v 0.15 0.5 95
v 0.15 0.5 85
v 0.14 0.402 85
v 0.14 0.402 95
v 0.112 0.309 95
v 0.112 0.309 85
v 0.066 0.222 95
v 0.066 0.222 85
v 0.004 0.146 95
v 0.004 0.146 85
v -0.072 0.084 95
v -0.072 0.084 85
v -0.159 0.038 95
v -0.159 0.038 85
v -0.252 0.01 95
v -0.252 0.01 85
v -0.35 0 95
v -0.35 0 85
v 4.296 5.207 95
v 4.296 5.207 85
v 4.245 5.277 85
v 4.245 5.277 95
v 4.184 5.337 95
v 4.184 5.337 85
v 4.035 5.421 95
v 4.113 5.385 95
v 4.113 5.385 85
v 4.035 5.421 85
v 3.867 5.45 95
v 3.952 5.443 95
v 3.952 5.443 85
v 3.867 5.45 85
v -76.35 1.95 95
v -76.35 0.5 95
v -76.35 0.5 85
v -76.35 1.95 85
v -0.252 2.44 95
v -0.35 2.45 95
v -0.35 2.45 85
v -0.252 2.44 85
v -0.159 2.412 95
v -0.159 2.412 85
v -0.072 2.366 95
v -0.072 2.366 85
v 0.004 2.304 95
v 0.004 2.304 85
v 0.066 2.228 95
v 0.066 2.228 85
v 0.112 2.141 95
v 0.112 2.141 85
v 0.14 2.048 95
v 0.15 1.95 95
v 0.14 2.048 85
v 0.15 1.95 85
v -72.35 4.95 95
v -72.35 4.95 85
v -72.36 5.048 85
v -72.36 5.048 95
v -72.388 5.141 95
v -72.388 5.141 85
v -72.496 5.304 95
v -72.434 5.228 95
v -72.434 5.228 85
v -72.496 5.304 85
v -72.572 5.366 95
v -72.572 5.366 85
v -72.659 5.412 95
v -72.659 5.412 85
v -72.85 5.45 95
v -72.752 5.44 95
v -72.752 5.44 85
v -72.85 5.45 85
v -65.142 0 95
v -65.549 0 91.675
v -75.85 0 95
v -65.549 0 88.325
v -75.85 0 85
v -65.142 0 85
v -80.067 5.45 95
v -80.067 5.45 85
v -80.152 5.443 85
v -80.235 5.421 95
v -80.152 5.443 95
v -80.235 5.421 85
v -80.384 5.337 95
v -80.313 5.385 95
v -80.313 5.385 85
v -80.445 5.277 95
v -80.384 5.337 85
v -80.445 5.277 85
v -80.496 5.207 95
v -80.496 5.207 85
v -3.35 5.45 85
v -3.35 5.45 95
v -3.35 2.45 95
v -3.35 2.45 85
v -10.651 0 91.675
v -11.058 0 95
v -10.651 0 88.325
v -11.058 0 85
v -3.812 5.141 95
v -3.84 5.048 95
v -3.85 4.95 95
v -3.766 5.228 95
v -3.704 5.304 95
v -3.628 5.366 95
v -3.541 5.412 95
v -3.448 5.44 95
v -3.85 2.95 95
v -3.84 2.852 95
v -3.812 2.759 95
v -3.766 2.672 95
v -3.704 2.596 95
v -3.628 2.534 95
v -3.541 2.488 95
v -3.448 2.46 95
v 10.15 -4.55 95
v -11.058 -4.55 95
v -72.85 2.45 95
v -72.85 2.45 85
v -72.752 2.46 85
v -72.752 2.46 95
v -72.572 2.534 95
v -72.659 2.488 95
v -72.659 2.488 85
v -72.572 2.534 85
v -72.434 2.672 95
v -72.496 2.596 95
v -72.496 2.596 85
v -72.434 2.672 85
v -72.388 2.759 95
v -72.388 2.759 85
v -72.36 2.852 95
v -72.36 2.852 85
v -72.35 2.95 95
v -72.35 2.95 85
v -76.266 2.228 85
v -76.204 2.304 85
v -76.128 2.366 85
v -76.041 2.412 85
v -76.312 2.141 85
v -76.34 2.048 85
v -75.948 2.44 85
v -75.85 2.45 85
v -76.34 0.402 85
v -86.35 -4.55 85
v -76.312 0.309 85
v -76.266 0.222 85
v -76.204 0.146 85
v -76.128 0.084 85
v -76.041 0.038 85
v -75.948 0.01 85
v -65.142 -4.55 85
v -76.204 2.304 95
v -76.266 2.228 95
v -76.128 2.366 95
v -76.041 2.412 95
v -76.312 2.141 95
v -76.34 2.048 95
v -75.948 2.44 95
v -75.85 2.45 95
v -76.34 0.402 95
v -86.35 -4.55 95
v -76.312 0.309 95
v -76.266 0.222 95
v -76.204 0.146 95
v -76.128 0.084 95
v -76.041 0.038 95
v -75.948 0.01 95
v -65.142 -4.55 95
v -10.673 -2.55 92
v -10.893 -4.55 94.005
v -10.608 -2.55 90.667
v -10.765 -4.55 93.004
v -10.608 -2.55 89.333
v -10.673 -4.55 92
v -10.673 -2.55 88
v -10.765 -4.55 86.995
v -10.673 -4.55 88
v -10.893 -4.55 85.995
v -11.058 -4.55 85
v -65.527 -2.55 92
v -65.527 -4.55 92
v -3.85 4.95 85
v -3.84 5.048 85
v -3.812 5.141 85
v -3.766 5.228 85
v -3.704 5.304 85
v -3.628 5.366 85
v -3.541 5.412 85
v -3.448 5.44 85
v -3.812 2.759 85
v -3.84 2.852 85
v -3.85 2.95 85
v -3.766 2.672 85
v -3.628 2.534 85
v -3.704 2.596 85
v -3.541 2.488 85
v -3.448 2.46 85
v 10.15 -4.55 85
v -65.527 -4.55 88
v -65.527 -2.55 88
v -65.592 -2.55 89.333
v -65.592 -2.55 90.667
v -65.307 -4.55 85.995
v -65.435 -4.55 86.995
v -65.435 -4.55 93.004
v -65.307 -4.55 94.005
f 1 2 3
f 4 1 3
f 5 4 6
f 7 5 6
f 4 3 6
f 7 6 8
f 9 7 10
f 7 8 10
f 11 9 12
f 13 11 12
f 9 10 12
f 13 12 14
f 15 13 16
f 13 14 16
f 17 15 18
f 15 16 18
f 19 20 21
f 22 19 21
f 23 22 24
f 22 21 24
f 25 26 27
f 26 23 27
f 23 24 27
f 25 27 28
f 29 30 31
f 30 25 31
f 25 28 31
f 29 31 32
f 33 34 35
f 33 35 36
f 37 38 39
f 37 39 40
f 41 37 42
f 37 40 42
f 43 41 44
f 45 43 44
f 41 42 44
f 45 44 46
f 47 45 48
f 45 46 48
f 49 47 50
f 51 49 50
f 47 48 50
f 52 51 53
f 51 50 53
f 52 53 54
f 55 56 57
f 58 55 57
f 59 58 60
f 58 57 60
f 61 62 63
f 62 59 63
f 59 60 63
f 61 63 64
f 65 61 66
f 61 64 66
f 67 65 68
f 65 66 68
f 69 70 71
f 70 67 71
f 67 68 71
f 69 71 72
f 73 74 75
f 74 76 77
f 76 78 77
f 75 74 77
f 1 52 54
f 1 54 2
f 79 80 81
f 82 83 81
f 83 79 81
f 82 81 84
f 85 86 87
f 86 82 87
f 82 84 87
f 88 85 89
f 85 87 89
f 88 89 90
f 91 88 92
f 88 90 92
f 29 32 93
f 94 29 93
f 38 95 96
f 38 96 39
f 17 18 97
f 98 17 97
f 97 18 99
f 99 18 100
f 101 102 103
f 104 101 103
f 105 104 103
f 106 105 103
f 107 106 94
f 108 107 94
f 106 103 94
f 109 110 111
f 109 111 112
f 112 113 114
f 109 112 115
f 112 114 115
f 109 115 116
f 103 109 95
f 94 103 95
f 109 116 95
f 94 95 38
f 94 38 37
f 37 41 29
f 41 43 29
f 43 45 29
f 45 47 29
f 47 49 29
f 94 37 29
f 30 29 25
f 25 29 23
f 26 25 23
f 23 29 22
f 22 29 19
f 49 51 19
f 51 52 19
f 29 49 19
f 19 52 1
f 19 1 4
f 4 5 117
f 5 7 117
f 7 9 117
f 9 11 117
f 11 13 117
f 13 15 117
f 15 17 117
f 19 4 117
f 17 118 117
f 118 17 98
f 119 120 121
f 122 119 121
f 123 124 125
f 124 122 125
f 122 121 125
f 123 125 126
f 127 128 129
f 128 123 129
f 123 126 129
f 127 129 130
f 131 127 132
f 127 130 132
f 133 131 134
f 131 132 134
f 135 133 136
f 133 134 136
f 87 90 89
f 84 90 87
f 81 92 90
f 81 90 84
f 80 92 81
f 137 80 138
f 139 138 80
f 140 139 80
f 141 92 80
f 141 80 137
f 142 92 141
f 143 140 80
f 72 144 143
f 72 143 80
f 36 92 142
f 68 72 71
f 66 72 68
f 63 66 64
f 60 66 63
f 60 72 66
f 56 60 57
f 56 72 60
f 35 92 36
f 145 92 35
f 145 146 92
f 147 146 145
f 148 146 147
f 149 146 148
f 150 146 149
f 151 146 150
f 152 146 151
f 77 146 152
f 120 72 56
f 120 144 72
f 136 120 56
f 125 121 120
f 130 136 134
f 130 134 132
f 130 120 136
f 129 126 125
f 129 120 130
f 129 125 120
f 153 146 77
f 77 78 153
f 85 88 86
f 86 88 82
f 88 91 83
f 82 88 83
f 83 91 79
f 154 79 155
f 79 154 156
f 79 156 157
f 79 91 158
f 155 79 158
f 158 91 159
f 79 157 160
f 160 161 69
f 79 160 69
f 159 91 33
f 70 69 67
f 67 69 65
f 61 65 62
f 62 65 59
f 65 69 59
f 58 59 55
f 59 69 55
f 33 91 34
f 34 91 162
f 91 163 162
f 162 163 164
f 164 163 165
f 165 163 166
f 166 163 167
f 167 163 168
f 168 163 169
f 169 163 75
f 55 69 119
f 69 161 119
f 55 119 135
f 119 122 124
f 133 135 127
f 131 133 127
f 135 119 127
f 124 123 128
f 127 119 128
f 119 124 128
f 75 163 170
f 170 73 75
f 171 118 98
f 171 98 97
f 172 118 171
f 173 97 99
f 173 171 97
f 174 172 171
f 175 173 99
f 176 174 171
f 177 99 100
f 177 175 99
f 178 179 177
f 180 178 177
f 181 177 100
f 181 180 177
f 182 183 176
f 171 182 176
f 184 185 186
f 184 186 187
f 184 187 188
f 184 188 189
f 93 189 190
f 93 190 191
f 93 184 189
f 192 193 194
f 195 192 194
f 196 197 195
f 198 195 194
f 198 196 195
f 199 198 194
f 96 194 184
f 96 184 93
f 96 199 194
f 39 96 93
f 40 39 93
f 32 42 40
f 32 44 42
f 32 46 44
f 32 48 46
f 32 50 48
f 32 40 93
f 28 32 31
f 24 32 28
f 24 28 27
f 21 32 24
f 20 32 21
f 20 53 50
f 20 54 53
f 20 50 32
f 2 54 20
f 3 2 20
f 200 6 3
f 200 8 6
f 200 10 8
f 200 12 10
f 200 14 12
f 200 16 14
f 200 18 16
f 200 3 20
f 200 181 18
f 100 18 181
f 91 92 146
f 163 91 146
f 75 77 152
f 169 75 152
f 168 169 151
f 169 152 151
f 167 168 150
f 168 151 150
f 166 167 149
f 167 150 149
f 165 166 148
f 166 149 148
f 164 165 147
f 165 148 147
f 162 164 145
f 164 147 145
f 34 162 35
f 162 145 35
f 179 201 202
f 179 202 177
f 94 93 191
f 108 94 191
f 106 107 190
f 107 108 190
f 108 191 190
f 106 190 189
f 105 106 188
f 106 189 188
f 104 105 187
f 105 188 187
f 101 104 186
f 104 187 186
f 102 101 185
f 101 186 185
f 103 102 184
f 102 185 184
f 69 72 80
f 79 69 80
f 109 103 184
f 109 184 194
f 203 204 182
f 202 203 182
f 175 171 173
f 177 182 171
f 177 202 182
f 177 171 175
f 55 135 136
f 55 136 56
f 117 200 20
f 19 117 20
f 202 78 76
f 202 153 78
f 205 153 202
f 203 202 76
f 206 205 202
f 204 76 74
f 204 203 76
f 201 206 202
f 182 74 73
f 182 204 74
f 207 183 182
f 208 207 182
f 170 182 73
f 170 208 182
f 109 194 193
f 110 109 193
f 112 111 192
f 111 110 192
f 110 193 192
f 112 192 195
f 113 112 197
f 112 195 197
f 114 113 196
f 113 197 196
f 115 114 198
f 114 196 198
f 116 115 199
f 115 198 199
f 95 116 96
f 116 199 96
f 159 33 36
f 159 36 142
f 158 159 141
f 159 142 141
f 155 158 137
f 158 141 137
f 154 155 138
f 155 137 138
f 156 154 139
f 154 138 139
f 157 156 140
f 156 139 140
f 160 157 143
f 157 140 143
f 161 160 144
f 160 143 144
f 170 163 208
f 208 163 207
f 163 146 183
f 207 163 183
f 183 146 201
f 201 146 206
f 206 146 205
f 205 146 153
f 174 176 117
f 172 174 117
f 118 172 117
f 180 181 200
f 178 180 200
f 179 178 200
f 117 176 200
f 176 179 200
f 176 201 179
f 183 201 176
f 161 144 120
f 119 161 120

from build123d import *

# Parameters (mm, degrees)
BOSS_EXTRUDE1_DEPTH     = 180
SKETCH2_W               = 91.04
SKETCH2_H               = 5.45
CUT_EXTRUDE1_DEPTH      = 30
SKETCH3_W               = 91.04
SKETCH3_H               = 5.45
CUT_EXTRUDE2_DEPTH      = 30
FILLET1_R               = 1
FILLET2_R               = 1
FILLET3_R               = 1
CUT_EXTRUDE3_DEPTH      = 200.714859237
CUT_EXTRUDE3_DEPTH_BACK = 200.714859237
SKETCH4_R               = 4
SKETCH4_R_2             = 27.5
CUT_EXTRUDE4_DEPTH      = 200.890776426
CUT_EXTRUDE4_DEPTH_BACK = 200.890776426
SKETCH6_W               = 96.5
SKETCH6_H               = 85
SKETCH7_W               = 55
SKETCH7_H               = 4
BOSS_EXTRUDE3_DEPTH     = 2


with BuildPart() as part:
    # Sketch1 → Boss-Extrude1 (new body)
    with BuildSketch(Plane.XY):
        with BuildLine():
            Line((-76.35, 0.5), (-76.35, 1.95))
            ThreePointArc((-76.35, 1.95), (-76.203553391, 2.303553391), (-75.85, 2.45))
            Line((-75.85, 2.45), (-72.85, 2.45))
            ThreePointArc((-72.85, 2.45), (-72.496446609, 2.596446609), (-72.35, 2.95))
            Line((-72.35, 2.95), (-72.35, 4.95))
            ThreePointArc((-72.35, 4.95), (-72.496446609, 5.303553391), (-72.85, 5.45))
            Line((-72.85, 5.45), (-79.85, 5.45))
            Line((-79.85, 5.45), (-80.066904811, 5.45))
            ThreePointArc((-80.066904811, 5.45), (-80.313254218, 5.385099953), (-80.495651273, 5.207247878))
            Line((-80.495651273, 5.207247878), (-86.35, -4.55))
            Line((-86.35, -4.55), (-80.35, -4.55))
            Line((-80.35, -4.55), (-79.85, -4.55))
            Line((-79.85, -4.55), (-38.1, -4.55))
            Line((-38.1, -4.55), (-38.1, 0))
            Line((-38.1, 0), (-75.85, 0))
            ThreePointArc((-75.85, 0), (-76.203553391, 0.146446609), (-76.35, 0.5))
        make_face()
        with BuildLine():
            Line((-0.35, 0), (-38.1, 0))
            Line((-38.1, 0), (-38.1, -4.55))
            Line((-38.1, -4.55), (3.65, -4.55))
            Line((3.65, -4.55), (4.15, -4.55))
            Line((4.15, -4.55), (10.15, -4.55))
            Line((10.15, -4.55), (4.295651273, 5.207247878))
            ThreePointArc((4.295651273, 5.207247878), (4.113254218, 5.385099953), (3.866904811, 5.45))
            Line((3.866904811, 5.45), (3.65, 5.45))
            Line((3.65, 5.45), (-3.35, 5.45))
            ThreePointArc((-3.35, 5.45), (-3.703553391, 5.303553391), (-3.85, 4.95))
            Line((-3.85, 4.95), (-3.85, 2.95))
            ThreePointArc((-3.85, 2.95), (-3.703553391, 2.596446609), (-3.35, 2.45))
            Line((-3.35, 2.45), (-0.35, 2.45))
            ThreePointArc((-0.35, 2.45), (0.003553391, 2.303553391), (0.15, 1.95))
            Line((0.15, 1.95), (0.15, 0.5))
            ThreePointArc((0.15, 0.5), (0.003553391, 0.146446609), (-0.35, 0))
        make_face()
    extrude(amount=BOSS_EXTRUDE1_DEPTH)

    # Sketch2 → Cut-Extrude1 (cut)
    with BuildSketch(Plane.XY.offset(180)):
        with Locations((-38.1, 2.725)):
            Rectangle(SKETCH2_W, SKETCH2_H)
    extrude(amount=-CUT_EXTRUDE1_DEPTH, mode=Mode.SUBTRACT)

    # Sketch3 → Cut-Extrude2 (cut)
    with BuildSketch(Plane(origin=(0, 0, 0), x_dir=(-1, 0, 0), z_dir=(0, 0, -1))):
        with Locations((38.1, 2.725)):
            Rectangle(SKETCH3_W, SKETCH3_H)
    extrude(amount=-CUT_EXTRUDE2_DEPTH, mode=Mode.SUBTRACT)

    # Fillet1
    fillet1_edges = [part.edges().sort_by_distance(p)[0] for p in [
        (-79.735, 0, 150),
    ]]
    fillet(fillet1_edges, radius=FILLET1_R)

    # Fillet2
    fillet2_edges = [part.edges().sort_by_distance(p)[0] for p in [
        (3.535, 0, 150),
    ]]
    fillet(fillet2_edges, radius=FILLET2_R)

    # Fillet3
    fillet3_edges = [part.edges().sort_by_distance(p)[0] for p in [
        (-79.735, 0, 30),
        (3.535, 0, 30),
    ]]
    fillet(fillet3_edges, radius=FILLET3_R)

    # Sketch4 → Cut-Extrude3 (cut, two sides: drawn at the far end of the back side and taken through both)
    with BuildSketch(Plane(origin=(0, 0, 0), x_dir=(1, 0, 0), z_dir=(0, 1, 0)).offset(-CUT_EXTRUDE3_DEPTH_BACK)):
        with BuildLine():
            Line((-28.1, -38), (-28.1, -2))
            ThreePointArc((-28.1, -2), (-27.514213562, -0.585786438), (-26.1, 0))
            Line((-26.1, 0), (-50.1, 0))
            ThreePointArc((-50.1, 0), (-48.685786438, -0.585786438), (-48.1, -2))
            Line((-48.1, -2), (-48.1, -38))
            ThreePointArc((-48.1, -38), (-47.514213562, -39.414213562), (-46.1, -40))
            Line((-46.1, -40), (-30.1, -40))
            ThreePointArc((-30.1, -40), (-28.685786438, -39.414213562), (-28.1, -38))
        make_face()
        with Locations(Location((-75.35, -10, 0), (0, 0, 270))):
            Circle(SKETCH4_R)
        with Locations(Location((-61.35, -20, 0), (0, 0, 270))):
            Circle(SKETCH4_R)
        with Locations(Location((-14.85, -20, 0), (0, 0, 270))):
            Circle(SKETCH4_R)
        with Locations(Location((-0.85, -10, 0), (0, 0, 270))):
            Circle(SKETCH4_R)
        with Locations(Location((-38.1, -90, 0), (0, 0, 270))):
            Circle(SKETCH4_R_2)
        with BuildLine():
            ThreePointArc((-30.1, -140), (-28.685786438, -140.585786438), (-28.1, -142))
            Line((-28.1, -142), (-28.1, -178))
            ThreePointArc((-28.1, -178), (-27.514213562, -179.414213562), (-26.1, -180))
            Line((-26.1, -180), (-50.1, -180))
            ThreePointArc((-50.1, -180), (-48.685786438, -179.414213562), (-48.1, -178))
            Line((-48.1, -178), (-48.1, -142))
            ThreePointArc((-48.1, -142), (-47.514213562, -140.585786438), (-46.1, -140))
            Line((-46.1, -140), (-30.1, -140))
        make_face()
        with Locations(Location((-61.35, -160, 0), (0, 0, 270))):
            Circle(SKETCH4_R)
        with Locations(Location((-75.35, -170, 0), (0, 0, 270))):
            Circle(SKETCH4_R)
        with Locations(Location((-14.85, -160, 0), (0, 0, 270))):
            Circle(SKETCH4_R)
        with Locations(Location((-0.85, -170, 0), (0, 0, 270))):
            Circle(SKETCH4_R)
    extrude(amount=CUT_EXTRUDE3_DEPTH + CUT_EXTRUDE3_DEPTH_BACK, mode=Mode.SUBTRACT)

    # Sketch6 → Cut-Extrude4 (cut, two sides: drawn at the far end of the back side and taken through both)
    with BuildSketch(Plane(origin=(0, 5.45, 0), x_dir=(1, 0, 0), z_dir=(0, 1, 0)).offset(-CUT_EXTRUDE4_DEPTH_BACK)):
        with Locations((-38.1, -137.5)):
            Rectangle(SKETCH6_W, SKETCH6_H)
        with Locations((-38.1, -42.5)):
            Rectangle(SKETCH6_W, SKETCH6_H)
    extrude(amount=CUT_EXTRUDE4_DEPTH + CUT_EXTRUDE4_DEPTH_BACK, mode=Mode.SUBTRACT)


with BuildPart() as cut_extrude4_piece_1:
    # of the separate pieces the step leaves, piece 1, a body of its own (cut_extrude4_pieces)
    add(part.part.solids().sort_by_distance((-0.35, 0, 85))[0])



with BuildPart() as cut_extrude4_piece_2:
    # of the separate pieces the step leaves, piece 2, a body of its own (cut_extrude4_pieces)
    add(part.part.solids().sort_by_distance((-65.141634566, 0, 85))[0])


with BuildPart() as cut_extrude4_piece_1_1:
    add(cut_extrude4_piece_1.part)

    add(cut_extrude4_piece_2.part)  # Boss-Extrude3 merges Cut-Extrude4 piece 2
    # Sketch7 → Boss-Extrude3 (add)
    with BuildSketch(Plane(origin=(0, -4.55, 0), x_dir=(1, 0, 0), z_dir=(0, 1, 0))):
        with Locations((-38.1, -89.999911505)):
            Rectangle(SKETCH7_W, SKETCH7_H)
    extrude(amount=BOSS_EXTRUDE3_DEPTH)


solid = cut_extrude4_piece_1_1.part
